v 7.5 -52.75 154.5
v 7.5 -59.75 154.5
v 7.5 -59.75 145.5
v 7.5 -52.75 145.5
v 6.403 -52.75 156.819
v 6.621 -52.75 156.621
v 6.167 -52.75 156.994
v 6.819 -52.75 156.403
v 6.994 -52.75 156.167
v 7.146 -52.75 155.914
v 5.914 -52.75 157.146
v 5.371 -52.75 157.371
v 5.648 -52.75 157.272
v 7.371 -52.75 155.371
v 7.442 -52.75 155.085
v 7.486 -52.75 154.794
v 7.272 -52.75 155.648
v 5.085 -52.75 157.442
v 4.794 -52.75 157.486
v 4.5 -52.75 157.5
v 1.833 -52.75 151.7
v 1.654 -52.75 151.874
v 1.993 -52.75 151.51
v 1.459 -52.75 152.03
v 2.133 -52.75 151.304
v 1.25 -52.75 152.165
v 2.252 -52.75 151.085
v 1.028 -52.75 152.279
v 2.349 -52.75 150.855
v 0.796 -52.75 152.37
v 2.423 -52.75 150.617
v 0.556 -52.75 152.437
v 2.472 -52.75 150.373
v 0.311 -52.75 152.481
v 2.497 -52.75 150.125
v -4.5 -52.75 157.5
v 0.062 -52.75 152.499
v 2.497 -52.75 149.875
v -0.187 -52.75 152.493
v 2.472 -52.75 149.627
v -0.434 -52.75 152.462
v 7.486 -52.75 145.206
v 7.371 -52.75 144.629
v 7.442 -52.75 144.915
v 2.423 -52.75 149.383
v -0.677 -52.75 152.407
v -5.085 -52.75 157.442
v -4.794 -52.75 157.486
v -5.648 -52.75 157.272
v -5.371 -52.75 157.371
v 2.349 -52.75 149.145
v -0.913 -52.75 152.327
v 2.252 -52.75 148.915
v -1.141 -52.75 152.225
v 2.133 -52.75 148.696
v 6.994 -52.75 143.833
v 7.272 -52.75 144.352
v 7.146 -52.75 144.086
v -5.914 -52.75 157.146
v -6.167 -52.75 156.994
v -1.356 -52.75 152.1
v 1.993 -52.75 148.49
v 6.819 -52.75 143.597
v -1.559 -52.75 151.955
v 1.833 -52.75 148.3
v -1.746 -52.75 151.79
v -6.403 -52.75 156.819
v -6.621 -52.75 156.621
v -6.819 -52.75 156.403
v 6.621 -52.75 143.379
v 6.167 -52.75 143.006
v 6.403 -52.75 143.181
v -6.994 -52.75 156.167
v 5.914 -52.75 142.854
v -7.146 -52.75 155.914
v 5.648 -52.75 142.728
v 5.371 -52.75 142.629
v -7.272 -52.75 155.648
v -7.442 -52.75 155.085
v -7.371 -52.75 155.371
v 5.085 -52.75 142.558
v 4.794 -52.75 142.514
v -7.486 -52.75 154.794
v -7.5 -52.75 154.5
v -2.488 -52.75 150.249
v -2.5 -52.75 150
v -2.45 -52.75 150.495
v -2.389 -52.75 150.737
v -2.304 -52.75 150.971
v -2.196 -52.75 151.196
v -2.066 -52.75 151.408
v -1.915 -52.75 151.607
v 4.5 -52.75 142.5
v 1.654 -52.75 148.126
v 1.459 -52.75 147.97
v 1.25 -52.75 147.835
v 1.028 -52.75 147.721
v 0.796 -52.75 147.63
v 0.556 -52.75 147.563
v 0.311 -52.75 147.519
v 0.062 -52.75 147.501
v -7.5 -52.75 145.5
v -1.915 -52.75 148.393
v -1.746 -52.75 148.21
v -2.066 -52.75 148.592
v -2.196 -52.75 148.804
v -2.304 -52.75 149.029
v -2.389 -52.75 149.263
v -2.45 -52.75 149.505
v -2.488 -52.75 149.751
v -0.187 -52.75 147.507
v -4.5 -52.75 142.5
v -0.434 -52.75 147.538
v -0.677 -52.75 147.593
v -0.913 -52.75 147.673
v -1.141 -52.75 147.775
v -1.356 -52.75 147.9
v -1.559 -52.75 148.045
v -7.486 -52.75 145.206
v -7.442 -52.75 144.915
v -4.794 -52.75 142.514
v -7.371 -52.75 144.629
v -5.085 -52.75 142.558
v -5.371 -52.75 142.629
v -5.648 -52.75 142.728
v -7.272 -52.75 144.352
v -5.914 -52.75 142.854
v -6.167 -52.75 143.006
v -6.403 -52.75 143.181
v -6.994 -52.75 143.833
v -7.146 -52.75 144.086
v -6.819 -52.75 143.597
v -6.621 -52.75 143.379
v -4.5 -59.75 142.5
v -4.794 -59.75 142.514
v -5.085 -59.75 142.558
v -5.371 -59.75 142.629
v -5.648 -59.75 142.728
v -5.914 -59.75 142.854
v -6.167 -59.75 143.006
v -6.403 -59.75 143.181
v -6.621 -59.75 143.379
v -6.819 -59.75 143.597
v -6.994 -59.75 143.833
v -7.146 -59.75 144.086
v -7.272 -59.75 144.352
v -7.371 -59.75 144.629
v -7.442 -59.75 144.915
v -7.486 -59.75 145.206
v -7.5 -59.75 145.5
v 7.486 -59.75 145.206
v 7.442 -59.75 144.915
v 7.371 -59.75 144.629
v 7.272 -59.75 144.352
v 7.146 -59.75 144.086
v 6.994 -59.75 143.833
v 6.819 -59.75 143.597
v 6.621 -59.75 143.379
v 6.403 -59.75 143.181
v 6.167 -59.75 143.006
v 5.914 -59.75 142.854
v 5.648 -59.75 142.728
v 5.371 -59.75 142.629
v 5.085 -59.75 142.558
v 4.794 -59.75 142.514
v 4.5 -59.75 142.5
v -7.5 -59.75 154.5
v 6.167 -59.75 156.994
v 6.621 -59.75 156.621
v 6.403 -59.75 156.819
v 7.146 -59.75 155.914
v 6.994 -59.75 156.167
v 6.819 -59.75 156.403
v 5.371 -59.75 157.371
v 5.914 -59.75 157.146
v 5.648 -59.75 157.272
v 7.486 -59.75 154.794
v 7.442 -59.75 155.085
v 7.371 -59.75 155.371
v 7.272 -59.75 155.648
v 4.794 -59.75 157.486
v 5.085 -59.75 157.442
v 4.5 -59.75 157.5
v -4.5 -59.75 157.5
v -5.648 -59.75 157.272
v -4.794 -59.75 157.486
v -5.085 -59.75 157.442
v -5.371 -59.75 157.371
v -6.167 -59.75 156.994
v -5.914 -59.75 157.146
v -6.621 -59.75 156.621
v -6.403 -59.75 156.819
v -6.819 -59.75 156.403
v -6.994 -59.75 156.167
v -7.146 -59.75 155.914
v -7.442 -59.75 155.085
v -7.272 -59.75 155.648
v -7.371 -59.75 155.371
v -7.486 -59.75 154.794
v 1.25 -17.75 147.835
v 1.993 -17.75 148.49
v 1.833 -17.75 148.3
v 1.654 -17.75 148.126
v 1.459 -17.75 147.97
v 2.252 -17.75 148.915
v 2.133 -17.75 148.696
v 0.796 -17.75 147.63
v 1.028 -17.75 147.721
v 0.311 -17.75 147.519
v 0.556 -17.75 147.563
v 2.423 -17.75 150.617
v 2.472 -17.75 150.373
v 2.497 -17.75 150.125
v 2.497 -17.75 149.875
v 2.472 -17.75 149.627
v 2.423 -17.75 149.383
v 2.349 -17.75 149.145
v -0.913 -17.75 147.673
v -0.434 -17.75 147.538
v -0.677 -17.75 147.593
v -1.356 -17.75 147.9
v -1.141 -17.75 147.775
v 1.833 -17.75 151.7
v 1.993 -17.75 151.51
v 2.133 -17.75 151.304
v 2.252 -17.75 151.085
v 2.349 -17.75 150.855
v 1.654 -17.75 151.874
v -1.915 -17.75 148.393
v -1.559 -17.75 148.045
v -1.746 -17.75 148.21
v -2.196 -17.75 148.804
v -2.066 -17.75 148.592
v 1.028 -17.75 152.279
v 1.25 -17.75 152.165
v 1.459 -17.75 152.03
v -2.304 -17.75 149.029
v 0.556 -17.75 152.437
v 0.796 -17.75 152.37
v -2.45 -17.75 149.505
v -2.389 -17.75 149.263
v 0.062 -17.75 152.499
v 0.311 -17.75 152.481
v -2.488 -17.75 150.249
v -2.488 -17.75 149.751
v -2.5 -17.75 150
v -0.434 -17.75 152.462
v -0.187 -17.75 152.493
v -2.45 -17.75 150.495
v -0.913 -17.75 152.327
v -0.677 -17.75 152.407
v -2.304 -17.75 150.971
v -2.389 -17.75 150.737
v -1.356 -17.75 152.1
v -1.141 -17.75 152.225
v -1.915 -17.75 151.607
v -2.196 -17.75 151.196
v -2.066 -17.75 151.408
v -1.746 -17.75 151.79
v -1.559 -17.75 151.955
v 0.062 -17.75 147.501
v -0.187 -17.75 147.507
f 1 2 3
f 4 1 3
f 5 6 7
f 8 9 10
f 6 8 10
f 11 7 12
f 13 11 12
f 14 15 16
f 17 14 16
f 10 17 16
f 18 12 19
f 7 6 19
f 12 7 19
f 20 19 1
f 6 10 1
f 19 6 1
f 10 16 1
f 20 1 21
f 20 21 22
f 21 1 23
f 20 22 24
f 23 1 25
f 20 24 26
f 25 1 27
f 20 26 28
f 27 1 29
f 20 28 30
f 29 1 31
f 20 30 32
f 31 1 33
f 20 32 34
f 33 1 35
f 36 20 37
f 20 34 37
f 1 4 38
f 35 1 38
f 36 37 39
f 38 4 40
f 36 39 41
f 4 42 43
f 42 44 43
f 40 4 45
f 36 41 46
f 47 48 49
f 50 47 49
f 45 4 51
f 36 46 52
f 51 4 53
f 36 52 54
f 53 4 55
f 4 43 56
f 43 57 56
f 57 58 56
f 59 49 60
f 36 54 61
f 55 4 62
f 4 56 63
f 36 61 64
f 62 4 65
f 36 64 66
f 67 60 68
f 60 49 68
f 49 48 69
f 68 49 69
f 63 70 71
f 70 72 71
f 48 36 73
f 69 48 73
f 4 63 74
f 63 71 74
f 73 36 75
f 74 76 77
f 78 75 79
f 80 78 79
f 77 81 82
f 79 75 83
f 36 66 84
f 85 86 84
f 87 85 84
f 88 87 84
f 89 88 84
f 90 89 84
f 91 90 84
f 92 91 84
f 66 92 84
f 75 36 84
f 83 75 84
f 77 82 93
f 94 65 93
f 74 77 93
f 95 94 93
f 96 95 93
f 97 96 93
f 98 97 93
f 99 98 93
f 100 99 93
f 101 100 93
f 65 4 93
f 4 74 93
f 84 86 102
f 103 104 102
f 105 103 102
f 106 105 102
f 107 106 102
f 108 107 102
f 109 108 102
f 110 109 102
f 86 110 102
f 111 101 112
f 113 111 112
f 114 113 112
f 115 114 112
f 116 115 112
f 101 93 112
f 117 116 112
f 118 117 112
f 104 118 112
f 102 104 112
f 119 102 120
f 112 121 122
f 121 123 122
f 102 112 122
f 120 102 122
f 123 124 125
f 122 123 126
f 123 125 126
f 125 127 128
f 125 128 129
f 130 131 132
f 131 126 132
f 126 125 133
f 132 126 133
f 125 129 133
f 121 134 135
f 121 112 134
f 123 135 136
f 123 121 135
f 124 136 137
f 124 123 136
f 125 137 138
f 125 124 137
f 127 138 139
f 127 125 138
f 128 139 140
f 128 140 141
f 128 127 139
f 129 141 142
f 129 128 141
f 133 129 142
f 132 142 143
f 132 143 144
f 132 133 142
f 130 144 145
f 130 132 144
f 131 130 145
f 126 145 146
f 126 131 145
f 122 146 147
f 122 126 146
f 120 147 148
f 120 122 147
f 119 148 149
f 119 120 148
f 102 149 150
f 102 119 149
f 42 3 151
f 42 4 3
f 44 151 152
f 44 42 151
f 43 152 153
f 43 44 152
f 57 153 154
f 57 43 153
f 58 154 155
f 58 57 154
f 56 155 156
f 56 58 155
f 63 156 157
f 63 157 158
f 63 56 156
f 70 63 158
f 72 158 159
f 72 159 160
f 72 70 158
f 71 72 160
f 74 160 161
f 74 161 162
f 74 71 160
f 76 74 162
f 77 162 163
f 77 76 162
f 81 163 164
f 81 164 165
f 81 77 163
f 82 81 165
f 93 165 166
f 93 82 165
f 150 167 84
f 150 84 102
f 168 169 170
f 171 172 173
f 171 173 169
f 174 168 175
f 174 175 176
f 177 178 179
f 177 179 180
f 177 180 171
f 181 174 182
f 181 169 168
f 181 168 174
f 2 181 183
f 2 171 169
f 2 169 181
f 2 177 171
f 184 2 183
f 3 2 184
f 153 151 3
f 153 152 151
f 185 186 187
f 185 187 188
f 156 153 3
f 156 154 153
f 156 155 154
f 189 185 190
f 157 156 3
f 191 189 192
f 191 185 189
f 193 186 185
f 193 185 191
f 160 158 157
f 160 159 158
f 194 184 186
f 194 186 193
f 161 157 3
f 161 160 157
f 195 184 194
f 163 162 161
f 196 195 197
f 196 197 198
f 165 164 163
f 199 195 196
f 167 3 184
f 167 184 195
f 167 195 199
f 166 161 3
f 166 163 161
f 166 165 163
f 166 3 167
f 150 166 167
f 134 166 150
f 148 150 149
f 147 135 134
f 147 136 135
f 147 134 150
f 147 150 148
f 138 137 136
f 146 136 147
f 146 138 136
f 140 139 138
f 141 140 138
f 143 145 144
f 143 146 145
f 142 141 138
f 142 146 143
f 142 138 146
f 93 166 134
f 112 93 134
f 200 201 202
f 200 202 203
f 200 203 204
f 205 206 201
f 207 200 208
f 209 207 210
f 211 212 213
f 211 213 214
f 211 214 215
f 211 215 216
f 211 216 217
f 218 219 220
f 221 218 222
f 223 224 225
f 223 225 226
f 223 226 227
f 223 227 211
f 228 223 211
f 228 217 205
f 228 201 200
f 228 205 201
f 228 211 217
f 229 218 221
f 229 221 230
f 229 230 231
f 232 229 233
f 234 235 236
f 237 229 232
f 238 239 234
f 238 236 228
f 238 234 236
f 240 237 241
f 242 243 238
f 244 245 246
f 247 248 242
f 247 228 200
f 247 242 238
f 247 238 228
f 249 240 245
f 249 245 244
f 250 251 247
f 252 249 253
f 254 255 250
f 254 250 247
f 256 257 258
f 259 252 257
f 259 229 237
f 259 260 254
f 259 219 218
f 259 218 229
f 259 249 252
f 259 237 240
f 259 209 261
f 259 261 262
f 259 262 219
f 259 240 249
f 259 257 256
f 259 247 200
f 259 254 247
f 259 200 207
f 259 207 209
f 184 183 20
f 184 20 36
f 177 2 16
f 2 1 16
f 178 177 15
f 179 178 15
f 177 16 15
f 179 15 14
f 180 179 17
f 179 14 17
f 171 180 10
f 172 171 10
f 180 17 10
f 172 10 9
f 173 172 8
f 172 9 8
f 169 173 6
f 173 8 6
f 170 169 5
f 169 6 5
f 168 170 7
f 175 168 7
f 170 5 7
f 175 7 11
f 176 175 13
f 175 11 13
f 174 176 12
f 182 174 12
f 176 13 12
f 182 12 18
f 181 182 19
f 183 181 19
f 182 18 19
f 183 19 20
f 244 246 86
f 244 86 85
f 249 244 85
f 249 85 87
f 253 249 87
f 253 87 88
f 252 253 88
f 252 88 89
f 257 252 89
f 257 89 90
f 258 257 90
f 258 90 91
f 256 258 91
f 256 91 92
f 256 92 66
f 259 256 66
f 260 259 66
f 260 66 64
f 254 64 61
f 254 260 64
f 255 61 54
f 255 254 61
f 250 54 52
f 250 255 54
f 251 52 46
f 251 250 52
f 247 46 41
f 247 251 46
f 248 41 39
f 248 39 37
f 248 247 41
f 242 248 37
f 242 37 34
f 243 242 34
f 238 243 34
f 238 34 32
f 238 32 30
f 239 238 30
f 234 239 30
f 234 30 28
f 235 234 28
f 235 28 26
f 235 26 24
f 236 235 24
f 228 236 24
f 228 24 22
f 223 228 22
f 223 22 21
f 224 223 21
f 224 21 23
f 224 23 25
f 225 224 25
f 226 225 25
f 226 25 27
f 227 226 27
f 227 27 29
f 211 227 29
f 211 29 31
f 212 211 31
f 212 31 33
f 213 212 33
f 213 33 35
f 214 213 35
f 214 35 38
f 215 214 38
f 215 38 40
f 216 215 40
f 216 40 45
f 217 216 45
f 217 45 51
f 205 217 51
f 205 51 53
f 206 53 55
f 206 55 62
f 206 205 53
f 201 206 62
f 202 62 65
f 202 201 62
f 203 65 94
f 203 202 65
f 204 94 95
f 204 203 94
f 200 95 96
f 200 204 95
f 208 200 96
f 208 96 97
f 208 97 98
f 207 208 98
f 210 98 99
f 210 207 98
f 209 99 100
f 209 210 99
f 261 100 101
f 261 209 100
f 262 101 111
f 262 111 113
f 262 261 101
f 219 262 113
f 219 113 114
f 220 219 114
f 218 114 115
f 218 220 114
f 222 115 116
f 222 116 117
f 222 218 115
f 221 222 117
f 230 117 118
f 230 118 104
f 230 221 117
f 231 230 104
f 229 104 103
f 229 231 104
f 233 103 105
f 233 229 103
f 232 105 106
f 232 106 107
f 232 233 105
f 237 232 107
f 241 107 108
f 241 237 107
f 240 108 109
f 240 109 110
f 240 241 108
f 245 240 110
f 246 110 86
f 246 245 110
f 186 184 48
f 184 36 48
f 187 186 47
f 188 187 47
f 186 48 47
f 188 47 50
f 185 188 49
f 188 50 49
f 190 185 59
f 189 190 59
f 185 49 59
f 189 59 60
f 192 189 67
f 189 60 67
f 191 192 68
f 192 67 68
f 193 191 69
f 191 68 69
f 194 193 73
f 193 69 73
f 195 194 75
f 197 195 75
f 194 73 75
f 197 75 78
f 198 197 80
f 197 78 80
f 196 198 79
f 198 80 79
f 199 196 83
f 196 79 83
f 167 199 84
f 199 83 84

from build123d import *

# Parameters (mm, degrees)
SKETCH143_R             = 2.5
PAD073_DEPTH            = 42
SKETCH142_W             = 15
SKETCH142_H             = 15
PAD074_DEPTH            = 7
FILLET002_R             = 3
BODY042_PLACEMENT_ANGLE = 180


with BuildPart() as part:
    # Sketch143 → Pad073 (new body)
    with BuildSketch(Plane.XZ):
        Circle(SKETCH143_R)
    extrude(amount=-PAD073_DEPTH)

    # Sketch142 (on Face3 of Pad073) → Pad074 (join)
    with BuildSketch(Plane(origin=(0, 42, 0), x_dir=(1, 0, 0), z_dir=(0, 1, 0))):
        Rectangle(SKETCH142_W, SKETCH142_H)
    extrude(amount=-PAD074_DEPTH)

    # Fillet002
    fillet002_edges = [part.edges().sort_by_distance(p)[0] for p in [
        (7.5, 38.5, -7.5),
        (7.5, 38.5, 7.5),
        (-7.5, 38.5, 7.5),
        (-7.5, 38.5, -7.5),
    ]]
    fillet(fillet002_edges, radius=FILLET002_R)


with BuildPart() as part_1:
    # Body042 placement: moved
    add(part.part.moved(Location((0, -17.75, 150))).rotate(Axis((0, -17.75, 150), (0, 0, 1)), BODY042_PLACEMENT_ANGLE))


solid = part_1.part
